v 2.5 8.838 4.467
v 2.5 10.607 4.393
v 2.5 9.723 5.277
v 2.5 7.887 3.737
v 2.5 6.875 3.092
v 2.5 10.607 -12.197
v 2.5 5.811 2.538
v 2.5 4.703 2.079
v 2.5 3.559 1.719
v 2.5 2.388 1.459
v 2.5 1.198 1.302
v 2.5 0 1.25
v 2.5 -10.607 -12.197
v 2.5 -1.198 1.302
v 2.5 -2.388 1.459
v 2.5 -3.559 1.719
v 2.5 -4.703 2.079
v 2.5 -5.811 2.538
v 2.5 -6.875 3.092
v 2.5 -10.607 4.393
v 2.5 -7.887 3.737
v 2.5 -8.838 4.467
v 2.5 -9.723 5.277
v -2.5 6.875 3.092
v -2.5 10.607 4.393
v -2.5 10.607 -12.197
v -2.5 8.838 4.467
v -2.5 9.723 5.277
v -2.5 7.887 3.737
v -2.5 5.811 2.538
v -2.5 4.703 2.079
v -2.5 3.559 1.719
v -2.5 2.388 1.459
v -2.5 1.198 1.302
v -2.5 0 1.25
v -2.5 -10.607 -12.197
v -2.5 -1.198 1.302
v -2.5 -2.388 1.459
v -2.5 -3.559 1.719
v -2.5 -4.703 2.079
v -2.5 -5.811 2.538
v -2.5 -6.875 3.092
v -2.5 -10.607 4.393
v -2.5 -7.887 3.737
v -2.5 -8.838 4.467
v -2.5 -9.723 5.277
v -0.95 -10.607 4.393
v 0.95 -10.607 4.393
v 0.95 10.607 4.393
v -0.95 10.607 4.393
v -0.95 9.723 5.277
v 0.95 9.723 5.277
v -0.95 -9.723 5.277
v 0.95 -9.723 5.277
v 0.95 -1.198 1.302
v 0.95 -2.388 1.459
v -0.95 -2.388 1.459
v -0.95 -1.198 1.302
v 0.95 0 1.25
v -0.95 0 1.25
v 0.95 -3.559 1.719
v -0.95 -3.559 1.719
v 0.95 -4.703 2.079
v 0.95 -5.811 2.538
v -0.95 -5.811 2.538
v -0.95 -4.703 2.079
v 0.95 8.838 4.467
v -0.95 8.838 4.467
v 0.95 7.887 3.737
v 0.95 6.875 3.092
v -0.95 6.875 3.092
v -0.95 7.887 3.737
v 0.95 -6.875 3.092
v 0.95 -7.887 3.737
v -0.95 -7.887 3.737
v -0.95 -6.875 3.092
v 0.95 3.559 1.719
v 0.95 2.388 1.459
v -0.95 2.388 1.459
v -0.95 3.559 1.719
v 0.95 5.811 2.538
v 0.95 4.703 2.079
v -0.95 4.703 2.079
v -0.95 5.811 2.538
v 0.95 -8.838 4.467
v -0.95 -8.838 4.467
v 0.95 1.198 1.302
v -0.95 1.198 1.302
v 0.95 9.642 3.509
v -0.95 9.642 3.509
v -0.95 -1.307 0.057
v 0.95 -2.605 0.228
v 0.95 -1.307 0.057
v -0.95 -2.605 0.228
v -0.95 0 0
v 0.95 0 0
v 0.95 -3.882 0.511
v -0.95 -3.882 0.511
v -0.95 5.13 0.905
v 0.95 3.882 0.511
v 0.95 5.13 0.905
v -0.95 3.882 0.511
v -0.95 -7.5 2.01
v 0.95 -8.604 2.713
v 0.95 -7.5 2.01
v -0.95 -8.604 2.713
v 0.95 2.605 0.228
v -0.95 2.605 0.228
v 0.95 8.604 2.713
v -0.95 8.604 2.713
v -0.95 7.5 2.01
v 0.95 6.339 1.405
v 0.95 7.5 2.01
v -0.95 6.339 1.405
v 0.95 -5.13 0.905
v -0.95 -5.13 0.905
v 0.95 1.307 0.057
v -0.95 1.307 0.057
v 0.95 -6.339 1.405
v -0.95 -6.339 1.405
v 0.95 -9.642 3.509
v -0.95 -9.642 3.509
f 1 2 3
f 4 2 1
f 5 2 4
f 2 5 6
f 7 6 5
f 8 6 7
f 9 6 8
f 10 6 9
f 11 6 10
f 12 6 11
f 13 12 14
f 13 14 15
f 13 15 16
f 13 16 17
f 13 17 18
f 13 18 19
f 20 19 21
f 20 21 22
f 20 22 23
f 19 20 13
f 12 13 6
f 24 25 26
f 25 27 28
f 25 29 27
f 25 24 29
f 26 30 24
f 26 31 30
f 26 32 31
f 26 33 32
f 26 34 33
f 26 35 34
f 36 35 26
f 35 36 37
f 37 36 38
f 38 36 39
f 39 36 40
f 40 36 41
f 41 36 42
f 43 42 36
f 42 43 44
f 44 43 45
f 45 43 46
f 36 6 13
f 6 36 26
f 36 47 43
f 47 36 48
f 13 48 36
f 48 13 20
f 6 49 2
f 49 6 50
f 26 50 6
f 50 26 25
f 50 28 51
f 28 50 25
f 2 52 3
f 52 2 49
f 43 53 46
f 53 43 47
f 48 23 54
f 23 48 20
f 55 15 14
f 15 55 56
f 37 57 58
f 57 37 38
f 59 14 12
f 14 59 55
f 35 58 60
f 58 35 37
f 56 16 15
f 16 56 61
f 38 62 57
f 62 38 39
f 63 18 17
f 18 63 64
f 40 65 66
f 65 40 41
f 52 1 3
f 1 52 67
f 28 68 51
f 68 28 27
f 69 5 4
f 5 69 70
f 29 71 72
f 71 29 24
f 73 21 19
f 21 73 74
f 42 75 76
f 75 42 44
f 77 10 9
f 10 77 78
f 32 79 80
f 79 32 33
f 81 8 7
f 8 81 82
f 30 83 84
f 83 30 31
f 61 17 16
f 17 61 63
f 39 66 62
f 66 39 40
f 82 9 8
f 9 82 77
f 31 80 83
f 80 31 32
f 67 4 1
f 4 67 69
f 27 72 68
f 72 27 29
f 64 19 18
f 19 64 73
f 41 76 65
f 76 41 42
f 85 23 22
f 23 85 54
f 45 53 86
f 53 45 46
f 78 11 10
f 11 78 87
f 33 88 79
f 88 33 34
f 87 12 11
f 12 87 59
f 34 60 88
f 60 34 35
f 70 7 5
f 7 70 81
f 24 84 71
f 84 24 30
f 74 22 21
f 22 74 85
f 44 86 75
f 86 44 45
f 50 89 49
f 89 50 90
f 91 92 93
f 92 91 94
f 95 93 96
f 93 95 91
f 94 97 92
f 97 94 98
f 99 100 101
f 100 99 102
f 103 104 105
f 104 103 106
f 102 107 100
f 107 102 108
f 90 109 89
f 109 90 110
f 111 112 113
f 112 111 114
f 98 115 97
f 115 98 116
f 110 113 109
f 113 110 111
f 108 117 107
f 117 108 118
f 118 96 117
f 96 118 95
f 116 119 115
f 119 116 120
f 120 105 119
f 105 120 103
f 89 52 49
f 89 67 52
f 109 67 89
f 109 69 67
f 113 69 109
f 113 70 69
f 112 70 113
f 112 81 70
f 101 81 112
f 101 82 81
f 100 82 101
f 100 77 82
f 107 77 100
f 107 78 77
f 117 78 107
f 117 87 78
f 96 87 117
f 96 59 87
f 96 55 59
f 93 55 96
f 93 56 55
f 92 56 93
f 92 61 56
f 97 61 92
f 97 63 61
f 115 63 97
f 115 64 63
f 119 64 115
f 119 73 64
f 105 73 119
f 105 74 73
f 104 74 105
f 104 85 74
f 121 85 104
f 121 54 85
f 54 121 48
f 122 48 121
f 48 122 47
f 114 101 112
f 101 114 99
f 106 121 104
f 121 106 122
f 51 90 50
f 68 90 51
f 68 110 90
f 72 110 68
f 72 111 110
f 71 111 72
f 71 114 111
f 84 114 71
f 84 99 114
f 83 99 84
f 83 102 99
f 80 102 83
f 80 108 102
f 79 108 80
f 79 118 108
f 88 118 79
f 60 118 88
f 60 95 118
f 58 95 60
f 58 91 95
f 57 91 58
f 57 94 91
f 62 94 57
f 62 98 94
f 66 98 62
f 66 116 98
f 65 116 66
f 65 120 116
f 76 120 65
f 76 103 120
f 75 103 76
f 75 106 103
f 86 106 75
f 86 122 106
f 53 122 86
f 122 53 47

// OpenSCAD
// file: Pin_Header.scad
$fn = 72;

pin_header();

module straight_pin()
{
    union()
    {
        // Plastic
        color("black")
        translate([0,0,1.25])
        cube([2.54, 2.54, 2.5], center=true);
        
        // Connection Pin
        color("gold")
        translate([0,0,2.5])
        cylinder(d=.65, h=6);
        
        // Soldering pin
        color("gold")
        translate([0,0,-3])
        cylinder(d=.65, h=3);
    }
}

module pin_header(rows=1, columns=1)
{
    translate([-(columns - 1) * 1.27, -(rows - 1) * 1.27,0])
    for (r = [0:(rows-1)])
    {
        for (c = [0:(columns-1)])
        {
            translate([c*2.54,r*2.54,0])
            straight_pin();
        }
    }
}
// file: OH090U.scad
OH090U();

module OH090U()
{
    color("black")
    translate([0,0,4.7/2])
    cube([1.6, 4.6, 4.7], center=true);
}
// file: Motor.scad
$fn = 36;

motor();

translate([11,0,0])
motor_mount();

//translate([-11,0,0])
//motor_mount();

module motor()
{
    translate([0,-7.5,0])
    rotate([90,0,90])
    difference()
    {
        union()
        {
            color("yellow")
            cube([37, 22.5, 19], center=true);
            
            color("yellow")
            translate([18.5 + 2.5,0,0])
            cube([5, 5, 3], center=true);
            
            color("grey")
            translate([-(18.5 + 14), 0, ])
            rotate([0,90,0])
            intersection()
            {
                cylinder(d=22.5, h=28, center=true);
                cube([19,22.5, 28], center=true);
            }
            
            color("white")
            translate([18.5 - 11,0,0])
            shaft();
        }
        
        rotate([0,90,-90])
        mounting_holes();
    }
}

module shaft(keyed=true)
{
    intersection()
    {
        cylinder(d=5.6, h=37, center=true);
        
        if (keyed)
        {
            cube([3.8, 5.5, 37], center=true);
        }
    }
}

module mounting_holes()
{
    rotate([90,0,90])
    union()
    {
        translate([-(18.5 - 5), 17.5/2, 0])
        cylinder(d=3.5, h=19*2, center=true);
        
        translate([-(18.5 - 5), -17.5/2, 0])
        cylinder(d=3.5, h=19*2, center=true);
    }
}

module motor_mount(thickness=3)
{
    translate([0,-7.5,0])
    
    union()
    {
        difference()
        {
            translate([0,0,-6.125])
            cube([thickness, 40, 37.5], center=true);
            
            union()
            {
                mounting_holes();
                
                translate([0, 18.5 - 11,0])
                rotate([0,90,0])
                cylinder(d=7.5, h=37, center=true);
            }
        }
    
        /*
        translate([0,0,-6.125 - 37.5/2])
        difference()
        {
            rotate([0,45,0])
            cube([thickness*2, 40, thickness*2], center=true);
            
            translate([0,0,-thickness*2])
            cube([thickness*4, 40, thickness*4], center=true);
        }
        */
        
        difference()
        {
            union()
            {
                for (y_offset = [-15, 7.5])
                {
                    translate([-10.5,y_offset,-(22.5/2 + (37.5/2 - 6.125)/2) - .75])
                    cube([18,4,37.5/2 - 6.125 + .5], center=true);
                }
            }
            
            for (x_offset = [-15.5, -5.5])
            {
                for (y_offset = [-15, -22])
                {
                    translate([x_offset,0,y_offset])
                    union()
                    {
                        rotate([90,0,0])
                        cylinder(d=3.5,h=40, center=true); 
                    }
                }
            }
        }
    }
}
// main file
use <Motor.scad>;
use <OH090U.scad>;
use <Pin_Header.scad>;

$fn = 72;

//encoder();
//hall_sensors();
hall_sensors_mount();

module encoder(encoder_diameter=20, magnet_diameter=6.4, magnet_height=3.1)
{
    rotate([0,90,0])
    difference()
    {
        encoder_height = magnet_diameter*.7;
        
        cylinder(d=encoder_diameter, h=encoder_height, center=true);
        
        union()
        {
            shaft();
            
            magnet_offset = encoder_diameter/2 - magnet_height;
            
            translate([0,-magnet_offset,0])
            rotate([90,0,0])
            cylinder(d=magnet_diameter, h=magnet_height);
            
            translate([0,magnet_offset,0])
            rotate([-90,0,0])
            cylinder(d=magnet_diameter, h=magnet_height);
            
            translate([magnet_offset,0,0])
            rotate([0,90,0])
            cylinder(d=magnet_diameter, h=magnet_height);
            
            translate([-magnet_offset,0,0])
            rotate([0,-90,0])
            cylinder(d=magnet_diameter, h=magnet_height);
        }
    }
}

module hall_sensors(diameter=30, height=1.9, sensor_diameter=25, sensor_offset=4.5)
{
    translate([0,0,diameter/2])
    rotate([180,0,0])
    rotate([0,-90,0])
    difference()
    {
        union()
        {
            color("purple")
            cylinder(d=diameter, h=height, center=true);
            
            // Hall Sensors
            for (angle=[-22.5, 22.5])
            {
                color("black")
                rotate([0,0,angle])
                translate([sensor_diameter/2,0,height/2 + sensor_offset])
                OH090U();
            }

            // Headers
            scale([1,1,-1])
            union()
            {
                // Power
                rotate([0,0,-45])
                translate([5.98, 2, 0])
                pin_header(rows=1, columns=2);
                
                // Encoders
                rotate([0,0,-45])
                translate([2, 5.98, 0])
                pin_header(rows=2, columns=1);
            }
        }
        
        union()
        {
            translate([-diameter/2, 0, 0])
            cube([diameter, diameter, height*2], center=true);
            
            rotate([0,0,45])
            translate([-diameter/2, 0, 0])
            cube([diameter, diameter, height*2], center=true);
            
            rotate([0,0,-45])
            translate([-diameter/2, 0, 0])
            cube([diameter, diameter, height*2], center=true);
        }
    }
}

module hall_sensors_mount(diameter=30, thickness=5)
{
    difference()
    {
        translate([0,0,diameter/2])
        rotate([180,0,0])
        rotate([0,-90,0])
        difference()
        {
            union()
            {
                cylinder(d=diameter, h=thickness, center=true);
                
                translate([diameter/2 + 2.5,0,0])
                cube([15 + 4.39340, diameter*(sqrt(2)/2), thickness], center=true);
                
                translate([25,0,0])
                difference()
                {
                    //rotate([0,45,0])
                    //cube([thickness*1.5, diameter*(sqrt(2)/2), thickness*1.5], center=true);
                    
                    //translate([thickness*2,0,0])
                    //☺cube([thickness*4, diameter*(sqrt(2)/2), thickness*4], center=true);
                }
            }
            
            
            union()
            {
                translate([-diameter/2, 0, 0])
                cube([diameter, diameter, thickness*2], center=true);
                
                rotate([0,0,45])
                translate([-diameter/2, 0, 0])
                cube([diameter, diameter, thickness*2], center=true);
                
                rotate([0,0,-45])
                translate([-diameter/2, 0, 0])
                cube([diameter, diameter, thickness*2], center=true);
                
                cylinder(d=diameter-2.5, h=100, center=true);
            }
        }
            
        hall_sensors();
    }
}
